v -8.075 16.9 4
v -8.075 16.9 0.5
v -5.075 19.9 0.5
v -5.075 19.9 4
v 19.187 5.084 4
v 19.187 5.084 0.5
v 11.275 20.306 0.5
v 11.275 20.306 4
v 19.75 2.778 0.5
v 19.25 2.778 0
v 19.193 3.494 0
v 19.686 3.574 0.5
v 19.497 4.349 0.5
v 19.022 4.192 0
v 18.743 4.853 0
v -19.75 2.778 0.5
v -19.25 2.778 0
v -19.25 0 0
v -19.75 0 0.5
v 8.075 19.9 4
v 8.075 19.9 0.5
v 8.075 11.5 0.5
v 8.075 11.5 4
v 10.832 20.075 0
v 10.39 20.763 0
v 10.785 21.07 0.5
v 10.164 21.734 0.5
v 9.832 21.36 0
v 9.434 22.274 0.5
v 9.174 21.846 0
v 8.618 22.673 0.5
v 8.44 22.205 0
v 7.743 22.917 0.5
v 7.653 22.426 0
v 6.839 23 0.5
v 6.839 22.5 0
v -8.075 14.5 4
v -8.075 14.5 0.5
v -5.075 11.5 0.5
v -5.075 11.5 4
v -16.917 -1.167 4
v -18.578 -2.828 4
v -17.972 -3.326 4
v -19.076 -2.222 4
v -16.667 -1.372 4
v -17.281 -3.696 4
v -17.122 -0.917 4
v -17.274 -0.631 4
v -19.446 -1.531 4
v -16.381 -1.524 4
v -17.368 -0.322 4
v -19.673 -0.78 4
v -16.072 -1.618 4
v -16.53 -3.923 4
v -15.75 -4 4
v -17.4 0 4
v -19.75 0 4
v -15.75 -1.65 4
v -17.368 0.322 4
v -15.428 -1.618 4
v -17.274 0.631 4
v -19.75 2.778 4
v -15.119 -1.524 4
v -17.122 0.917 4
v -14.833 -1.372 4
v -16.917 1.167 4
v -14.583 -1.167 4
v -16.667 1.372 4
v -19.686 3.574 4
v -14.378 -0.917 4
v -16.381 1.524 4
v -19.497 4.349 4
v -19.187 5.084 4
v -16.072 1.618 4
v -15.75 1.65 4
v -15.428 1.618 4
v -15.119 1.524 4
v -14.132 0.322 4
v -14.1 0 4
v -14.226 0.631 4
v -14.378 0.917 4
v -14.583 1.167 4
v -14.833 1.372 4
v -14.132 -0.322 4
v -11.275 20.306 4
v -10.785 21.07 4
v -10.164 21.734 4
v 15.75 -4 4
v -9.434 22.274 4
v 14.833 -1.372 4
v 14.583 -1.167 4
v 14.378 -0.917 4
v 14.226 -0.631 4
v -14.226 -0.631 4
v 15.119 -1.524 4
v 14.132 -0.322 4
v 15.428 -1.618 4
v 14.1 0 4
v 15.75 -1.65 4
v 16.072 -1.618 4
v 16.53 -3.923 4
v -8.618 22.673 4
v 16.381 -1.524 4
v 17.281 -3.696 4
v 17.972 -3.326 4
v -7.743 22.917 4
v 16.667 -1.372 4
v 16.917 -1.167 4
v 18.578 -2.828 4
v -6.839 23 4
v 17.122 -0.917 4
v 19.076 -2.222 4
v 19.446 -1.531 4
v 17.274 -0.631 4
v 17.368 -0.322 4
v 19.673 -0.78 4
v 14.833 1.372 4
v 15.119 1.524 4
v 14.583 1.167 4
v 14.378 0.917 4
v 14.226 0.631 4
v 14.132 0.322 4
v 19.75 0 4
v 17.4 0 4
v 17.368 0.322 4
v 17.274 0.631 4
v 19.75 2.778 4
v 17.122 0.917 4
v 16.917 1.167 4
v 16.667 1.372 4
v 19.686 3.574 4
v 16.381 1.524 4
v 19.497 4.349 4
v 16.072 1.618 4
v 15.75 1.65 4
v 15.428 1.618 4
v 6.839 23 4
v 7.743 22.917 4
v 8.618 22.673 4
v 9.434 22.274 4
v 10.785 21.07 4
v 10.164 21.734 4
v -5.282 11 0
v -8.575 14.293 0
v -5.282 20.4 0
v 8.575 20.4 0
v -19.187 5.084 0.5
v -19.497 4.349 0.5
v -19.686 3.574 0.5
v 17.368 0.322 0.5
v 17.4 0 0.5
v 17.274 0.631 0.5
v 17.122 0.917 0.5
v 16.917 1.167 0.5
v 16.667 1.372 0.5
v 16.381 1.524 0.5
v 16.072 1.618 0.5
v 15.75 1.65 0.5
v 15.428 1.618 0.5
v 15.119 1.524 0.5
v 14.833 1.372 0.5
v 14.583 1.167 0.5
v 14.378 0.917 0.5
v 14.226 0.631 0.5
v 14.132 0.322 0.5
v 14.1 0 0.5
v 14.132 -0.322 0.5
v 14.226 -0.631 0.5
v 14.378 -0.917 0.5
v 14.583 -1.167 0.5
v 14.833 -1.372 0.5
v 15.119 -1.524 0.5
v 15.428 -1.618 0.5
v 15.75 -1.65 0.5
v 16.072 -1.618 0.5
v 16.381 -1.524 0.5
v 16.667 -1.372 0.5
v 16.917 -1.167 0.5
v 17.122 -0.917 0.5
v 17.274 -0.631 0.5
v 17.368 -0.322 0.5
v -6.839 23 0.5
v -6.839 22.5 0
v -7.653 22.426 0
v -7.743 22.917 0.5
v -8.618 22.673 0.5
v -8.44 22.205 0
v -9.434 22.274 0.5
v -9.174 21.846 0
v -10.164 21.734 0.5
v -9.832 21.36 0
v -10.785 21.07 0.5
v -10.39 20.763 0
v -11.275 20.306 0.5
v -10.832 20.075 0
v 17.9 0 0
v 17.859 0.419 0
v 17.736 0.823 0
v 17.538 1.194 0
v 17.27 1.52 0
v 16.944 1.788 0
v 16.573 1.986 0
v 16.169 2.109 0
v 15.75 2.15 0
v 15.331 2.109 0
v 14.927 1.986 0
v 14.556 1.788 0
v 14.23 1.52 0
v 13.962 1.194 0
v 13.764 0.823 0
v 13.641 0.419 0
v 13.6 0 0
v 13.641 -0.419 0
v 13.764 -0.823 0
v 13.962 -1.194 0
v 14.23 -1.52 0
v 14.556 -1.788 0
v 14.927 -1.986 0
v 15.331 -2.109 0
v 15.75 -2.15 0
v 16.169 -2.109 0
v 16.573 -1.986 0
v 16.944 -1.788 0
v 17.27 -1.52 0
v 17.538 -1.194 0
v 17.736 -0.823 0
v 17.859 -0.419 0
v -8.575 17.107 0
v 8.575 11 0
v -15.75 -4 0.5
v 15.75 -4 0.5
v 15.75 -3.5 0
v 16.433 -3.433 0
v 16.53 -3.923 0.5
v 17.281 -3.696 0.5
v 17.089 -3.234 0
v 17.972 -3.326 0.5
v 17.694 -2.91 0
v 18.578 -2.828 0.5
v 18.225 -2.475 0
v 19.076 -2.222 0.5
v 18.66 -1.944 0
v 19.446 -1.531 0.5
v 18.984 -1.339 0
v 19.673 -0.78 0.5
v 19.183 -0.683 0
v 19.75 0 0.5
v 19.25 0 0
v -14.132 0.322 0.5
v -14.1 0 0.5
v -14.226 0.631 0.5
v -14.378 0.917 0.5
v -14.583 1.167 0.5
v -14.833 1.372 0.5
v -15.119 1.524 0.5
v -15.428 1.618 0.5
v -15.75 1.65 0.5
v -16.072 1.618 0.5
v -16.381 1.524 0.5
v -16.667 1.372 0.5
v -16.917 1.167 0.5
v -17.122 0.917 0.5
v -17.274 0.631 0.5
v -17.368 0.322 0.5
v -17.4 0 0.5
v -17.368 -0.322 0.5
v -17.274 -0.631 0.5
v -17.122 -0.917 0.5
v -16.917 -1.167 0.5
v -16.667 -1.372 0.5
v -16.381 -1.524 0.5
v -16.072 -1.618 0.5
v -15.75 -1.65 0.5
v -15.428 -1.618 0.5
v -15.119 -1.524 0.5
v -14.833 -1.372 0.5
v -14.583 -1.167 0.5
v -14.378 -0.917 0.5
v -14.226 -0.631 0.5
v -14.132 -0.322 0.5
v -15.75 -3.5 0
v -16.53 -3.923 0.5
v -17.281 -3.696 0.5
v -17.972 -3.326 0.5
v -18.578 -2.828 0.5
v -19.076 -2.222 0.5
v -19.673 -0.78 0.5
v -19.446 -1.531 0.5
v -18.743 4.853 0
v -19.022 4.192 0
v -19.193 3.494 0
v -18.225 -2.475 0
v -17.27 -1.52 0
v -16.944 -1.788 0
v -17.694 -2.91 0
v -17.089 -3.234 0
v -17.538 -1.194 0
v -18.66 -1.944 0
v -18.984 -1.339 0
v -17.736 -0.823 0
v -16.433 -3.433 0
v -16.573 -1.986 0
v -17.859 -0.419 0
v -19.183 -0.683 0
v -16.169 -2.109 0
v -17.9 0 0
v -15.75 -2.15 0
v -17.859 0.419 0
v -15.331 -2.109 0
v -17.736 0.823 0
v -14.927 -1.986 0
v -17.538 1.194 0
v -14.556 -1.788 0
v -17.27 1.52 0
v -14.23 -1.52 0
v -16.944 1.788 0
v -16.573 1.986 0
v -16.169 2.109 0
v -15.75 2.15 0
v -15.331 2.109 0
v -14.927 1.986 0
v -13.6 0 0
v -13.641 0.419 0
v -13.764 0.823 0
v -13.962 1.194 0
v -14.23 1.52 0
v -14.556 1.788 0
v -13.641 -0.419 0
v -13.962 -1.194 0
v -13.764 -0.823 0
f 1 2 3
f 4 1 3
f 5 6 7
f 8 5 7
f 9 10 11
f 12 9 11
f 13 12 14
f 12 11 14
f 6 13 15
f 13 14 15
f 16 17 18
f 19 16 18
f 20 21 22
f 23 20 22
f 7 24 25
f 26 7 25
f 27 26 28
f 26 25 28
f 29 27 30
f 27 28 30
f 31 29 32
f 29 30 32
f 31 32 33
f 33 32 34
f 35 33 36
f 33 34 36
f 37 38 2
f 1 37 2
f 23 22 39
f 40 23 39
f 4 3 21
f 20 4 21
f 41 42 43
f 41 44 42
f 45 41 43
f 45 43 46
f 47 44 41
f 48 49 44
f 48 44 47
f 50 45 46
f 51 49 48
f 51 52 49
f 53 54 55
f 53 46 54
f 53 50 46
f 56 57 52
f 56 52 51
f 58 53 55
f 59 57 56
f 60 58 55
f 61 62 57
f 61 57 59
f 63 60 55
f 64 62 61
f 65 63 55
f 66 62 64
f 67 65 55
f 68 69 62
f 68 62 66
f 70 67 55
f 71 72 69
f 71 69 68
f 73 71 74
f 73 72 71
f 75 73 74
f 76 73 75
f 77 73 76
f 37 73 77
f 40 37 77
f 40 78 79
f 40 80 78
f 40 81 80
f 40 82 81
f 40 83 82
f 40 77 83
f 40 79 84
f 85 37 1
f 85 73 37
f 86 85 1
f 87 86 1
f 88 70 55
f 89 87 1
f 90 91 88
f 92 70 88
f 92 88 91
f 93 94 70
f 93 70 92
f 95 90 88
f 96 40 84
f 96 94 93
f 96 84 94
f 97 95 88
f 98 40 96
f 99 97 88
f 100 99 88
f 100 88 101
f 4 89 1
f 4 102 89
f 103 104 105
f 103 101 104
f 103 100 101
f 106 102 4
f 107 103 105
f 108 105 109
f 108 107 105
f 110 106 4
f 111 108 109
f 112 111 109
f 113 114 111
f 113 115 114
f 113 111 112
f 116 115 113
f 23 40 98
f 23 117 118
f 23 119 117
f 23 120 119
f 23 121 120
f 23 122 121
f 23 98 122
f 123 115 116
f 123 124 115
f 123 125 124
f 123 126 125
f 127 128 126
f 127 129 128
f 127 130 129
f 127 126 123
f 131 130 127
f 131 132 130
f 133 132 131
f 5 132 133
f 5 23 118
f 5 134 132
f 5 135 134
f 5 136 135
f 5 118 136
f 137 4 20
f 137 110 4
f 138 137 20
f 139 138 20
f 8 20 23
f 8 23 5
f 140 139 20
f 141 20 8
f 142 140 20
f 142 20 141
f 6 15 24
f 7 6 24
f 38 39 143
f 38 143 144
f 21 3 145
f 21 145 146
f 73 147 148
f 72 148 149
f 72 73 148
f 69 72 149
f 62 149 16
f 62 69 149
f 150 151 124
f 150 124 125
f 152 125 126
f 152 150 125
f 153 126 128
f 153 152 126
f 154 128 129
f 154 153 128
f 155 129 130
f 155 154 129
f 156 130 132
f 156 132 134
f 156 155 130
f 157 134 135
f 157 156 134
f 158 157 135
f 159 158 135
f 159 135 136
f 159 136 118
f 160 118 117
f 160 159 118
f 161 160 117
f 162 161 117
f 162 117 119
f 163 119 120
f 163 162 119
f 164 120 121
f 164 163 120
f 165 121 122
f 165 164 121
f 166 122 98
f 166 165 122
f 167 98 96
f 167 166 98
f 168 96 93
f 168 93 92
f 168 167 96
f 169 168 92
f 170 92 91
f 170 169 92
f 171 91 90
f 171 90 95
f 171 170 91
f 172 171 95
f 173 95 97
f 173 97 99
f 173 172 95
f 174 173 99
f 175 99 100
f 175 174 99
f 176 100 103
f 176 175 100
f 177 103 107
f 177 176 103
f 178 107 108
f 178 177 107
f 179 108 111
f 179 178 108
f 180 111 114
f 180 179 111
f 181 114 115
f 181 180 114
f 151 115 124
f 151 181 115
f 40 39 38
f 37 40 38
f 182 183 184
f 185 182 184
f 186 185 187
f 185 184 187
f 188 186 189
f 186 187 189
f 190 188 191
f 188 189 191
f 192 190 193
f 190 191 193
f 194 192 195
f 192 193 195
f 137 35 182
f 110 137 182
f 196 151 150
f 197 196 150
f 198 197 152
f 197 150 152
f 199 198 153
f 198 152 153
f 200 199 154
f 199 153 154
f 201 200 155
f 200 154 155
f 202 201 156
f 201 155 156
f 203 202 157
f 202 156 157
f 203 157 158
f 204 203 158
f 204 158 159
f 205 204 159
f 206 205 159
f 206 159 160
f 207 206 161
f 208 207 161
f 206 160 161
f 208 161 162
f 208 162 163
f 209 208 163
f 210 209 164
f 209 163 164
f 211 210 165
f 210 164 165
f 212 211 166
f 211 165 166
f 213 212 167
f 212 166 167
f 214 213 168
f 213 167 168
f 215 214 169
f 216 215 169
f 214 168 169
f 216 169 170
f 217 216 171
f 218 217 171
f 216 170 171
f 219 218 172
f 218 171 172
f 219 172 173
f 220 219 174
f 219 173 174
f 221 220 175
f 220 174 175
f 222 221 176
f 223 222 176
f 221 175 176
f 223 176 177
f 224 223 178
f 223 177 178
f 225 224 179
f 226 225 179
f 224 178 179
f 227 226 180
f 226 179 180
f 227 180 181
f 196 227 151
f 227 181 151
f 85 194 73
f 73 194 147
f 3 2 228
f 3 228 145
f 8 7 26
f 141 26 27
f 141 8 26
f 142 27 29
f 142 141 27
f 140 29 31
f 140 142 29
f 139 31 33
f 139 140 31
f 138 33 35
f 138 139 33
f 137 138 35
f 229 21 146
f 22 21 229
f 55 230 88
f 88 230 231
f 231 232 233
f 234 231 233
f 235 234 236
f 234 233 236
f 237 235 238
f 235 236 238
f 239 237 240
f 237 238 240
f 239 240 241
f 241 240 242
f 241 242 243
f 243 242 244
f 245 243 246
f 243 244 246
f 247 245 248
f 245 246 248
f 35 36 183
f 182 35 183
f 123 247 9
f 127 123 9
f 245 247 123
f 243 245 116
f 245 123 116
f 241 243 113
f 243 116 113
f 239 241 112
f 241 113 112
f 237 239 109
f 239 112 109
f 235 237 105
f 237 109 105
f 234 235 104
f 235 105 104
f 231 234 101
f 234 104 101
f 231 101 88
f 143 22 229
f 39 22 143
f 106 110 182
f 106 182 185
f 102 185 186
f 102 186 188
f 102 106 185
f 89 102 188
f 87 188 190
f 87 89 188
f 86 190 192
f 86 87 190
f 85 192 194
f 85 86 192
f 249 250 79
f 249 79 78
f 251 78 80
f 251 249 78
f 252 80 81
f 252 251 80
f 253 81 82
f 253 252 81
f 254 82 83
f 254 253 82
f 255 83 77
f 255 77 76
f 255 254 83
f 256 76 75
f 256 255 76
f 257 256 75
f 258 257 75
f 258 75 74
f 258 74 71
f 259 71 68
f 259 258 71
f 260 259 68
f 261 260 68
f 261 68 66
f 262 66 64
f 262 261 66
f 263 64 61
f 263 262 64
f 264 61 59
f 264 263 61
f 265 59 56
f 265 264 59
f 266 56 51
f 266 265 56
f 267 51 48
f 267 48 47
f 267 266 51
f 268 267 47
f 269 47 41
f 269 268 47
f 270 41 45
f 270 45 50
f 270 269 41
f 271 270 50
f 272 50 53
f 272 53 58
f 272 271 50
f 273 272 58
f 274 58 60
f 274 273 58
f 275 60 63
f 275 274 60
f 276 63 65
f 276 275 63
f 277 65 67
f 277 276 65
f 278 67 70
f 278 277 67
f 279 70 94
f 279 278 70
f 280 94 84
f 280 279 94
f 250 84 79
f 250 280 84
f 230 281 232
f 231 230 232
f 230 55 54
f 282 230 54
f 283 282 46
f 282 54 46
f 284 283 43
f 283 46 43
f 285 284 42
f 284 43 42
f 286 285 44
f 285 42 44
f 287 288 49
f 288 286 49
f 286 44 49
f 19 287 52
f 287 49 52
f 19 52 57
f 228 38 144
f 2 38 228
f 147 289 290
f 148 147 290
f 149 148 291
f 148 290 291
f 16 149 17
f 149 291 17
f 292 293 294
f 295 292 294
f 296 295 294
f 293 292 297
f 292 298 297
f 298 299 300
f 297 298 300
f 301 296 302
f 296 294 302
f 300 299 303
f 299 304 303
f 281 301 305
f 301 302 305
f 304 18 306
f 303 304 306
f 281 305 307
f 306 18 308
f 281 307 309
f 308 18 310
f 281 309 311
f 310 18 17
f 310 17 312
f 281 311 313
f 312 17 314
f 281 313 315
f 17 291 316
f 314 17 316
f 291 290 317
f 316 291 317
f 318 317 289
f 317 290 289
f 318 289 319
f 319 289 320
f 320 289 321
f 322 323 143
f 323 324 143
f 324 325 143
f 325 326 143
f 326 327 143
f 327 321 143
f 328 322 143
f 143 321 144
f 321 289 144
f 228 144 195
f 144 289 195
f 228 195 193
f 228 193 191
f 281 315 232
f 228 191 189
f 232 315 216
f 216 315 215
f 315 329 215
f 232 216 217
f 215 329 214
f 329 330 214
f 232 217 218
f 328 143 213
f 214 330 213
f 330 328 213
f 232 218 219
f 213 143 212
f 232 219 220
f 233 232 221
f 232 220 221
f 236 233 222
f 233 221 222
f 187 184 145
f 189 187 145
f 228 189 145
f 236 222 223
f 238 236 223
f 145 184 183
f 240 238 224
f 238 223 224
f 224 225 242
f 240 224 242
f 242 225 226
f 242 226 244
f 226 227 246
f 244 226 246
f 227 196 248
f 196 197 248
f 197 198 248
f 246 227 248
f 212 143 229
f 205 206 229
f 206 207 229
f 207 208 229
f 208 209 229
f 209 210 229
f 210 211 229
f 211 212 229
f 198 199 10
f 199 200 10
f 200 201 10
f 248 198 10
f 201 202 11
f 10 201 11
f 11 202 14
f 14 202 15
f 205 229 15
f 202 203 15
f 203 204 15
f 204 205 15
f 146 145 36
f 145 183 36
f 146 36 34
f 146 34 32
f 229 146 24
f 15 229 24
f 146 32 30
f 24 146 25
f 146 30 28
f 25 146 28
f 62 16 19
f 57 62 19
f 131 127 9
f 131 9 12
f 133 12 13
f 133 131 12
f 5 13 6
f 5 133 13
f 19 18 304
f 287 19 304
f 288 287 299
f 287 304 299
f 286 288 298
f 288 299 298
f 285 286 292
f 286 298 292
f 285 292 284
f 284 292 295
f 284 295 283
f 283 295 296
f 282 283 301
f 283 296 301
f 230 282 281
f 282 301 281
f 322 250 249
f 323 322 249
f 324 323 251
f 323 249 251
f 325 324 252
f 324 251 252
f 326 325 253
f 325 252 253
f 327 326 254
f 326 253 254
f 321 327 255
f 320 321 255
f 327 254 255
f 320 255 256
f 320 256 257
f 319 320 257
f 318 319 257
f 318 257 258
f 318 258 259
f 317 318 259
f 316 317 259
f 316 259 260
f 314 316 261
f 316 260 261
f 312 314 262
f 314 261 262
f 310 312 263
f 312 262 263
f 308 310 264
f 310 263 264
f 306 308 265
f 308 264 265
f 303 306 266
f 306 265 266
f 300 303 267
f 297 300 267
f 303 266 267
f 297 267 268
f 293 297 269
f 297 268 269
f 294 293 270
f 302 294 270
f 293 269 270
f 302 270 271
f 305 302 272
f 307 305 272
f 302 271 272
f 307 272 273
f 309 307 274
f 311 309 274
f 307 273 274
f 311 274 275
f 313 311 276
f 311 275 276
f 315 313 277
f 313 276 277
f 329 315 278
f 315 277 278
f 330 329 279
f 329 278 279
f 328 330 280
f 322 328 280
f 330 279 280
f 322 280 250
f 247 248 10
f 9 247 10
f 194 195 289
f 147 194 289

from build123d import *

# Parameters (mm, degrees)
F0_R     = 1.65
F1_DEPTH = 4
F2_R     = 5
F3_R     = 4
F4_SIZE  = 0.5


with BuildPart() as f1:
    # F0 (on Top) → F1 (new body)
    with BuildSketch(Plane.XY):
        Polygon((-19.75, -4), (0, -4), (19.75, -4), (19.75, 4), (9.875, 23), (0, 23), (-9.875, 23), (-19.75, 4), align=None)
        with Locations((-15.75, 0)):
            Circle(F0_R, mode=Mode.SUBTRACT)
        with Locations((15.75, 0)):
            Circle(F0_R, mode=Mode.SUBTRACT)
        Polygon((-8.075, 14.5), (-8.075, 15.7), (-8.075, 16.9), (-5.075, 19.9), (8.075, 19.9), (8.075, 15.7), (8.075, 11.5), (-5.075, 11.5), align=None, mode=Mode.SUBTRACT)
    extrude(amount=F1_DEPTH)

    # F2
    f2_edges = [f1.edges().sort_by_distance(p)[0] for p in [
        (-19.75, 4, 2),
        (-9.875, 23, 2),
        (9.875, 23, 2),
        (19.75, 4, 2),
    ]]
    fillet(f2_edges, radius=F2_R)

    # F3
    f3_edges = [f1.edges().sort_by_distance(p)[0] for p in [
        (19.75, -4, 2),
        (-19.75, -4, 2),
    ]]
    fillet(f3_edges, radius=F3_R)

    # F4
    f4_edges = [f1.edges().sort_by_distance(p)[0] for p in [
        (19.75, 1.38912, 0),
        (18.578427, -2.828427, 0),
        (19.607098, 3.965082, 0),
        (0, -4, 0),
        (15.230907, 12.694964, 0),
        (-18.578427, -2.828427, 0),
        (9.433953, 22.273712, 0),
        (-19.75, 1.38912, 0),
        (0, 23, 0),
        (-19.607098, 3.965082, 0),
        (-9.433953, 22.273712, 0),
        (-15.230907, 12.694964, 0),
        (-17.4, 0, 0),
        (14.1, 0, 0),
        (-8.075, 15.7, 0),
        (-6.575, 18.4, 0),
        (1.5, 19.9, 0),
        (8.075, 15.7, 0),
        (1.5, 11.5, 0),
        (-6.575, 13, 0),
    ]]
    chamfer(f4_edges, length=F4_SIZE)


solid = f1.part
